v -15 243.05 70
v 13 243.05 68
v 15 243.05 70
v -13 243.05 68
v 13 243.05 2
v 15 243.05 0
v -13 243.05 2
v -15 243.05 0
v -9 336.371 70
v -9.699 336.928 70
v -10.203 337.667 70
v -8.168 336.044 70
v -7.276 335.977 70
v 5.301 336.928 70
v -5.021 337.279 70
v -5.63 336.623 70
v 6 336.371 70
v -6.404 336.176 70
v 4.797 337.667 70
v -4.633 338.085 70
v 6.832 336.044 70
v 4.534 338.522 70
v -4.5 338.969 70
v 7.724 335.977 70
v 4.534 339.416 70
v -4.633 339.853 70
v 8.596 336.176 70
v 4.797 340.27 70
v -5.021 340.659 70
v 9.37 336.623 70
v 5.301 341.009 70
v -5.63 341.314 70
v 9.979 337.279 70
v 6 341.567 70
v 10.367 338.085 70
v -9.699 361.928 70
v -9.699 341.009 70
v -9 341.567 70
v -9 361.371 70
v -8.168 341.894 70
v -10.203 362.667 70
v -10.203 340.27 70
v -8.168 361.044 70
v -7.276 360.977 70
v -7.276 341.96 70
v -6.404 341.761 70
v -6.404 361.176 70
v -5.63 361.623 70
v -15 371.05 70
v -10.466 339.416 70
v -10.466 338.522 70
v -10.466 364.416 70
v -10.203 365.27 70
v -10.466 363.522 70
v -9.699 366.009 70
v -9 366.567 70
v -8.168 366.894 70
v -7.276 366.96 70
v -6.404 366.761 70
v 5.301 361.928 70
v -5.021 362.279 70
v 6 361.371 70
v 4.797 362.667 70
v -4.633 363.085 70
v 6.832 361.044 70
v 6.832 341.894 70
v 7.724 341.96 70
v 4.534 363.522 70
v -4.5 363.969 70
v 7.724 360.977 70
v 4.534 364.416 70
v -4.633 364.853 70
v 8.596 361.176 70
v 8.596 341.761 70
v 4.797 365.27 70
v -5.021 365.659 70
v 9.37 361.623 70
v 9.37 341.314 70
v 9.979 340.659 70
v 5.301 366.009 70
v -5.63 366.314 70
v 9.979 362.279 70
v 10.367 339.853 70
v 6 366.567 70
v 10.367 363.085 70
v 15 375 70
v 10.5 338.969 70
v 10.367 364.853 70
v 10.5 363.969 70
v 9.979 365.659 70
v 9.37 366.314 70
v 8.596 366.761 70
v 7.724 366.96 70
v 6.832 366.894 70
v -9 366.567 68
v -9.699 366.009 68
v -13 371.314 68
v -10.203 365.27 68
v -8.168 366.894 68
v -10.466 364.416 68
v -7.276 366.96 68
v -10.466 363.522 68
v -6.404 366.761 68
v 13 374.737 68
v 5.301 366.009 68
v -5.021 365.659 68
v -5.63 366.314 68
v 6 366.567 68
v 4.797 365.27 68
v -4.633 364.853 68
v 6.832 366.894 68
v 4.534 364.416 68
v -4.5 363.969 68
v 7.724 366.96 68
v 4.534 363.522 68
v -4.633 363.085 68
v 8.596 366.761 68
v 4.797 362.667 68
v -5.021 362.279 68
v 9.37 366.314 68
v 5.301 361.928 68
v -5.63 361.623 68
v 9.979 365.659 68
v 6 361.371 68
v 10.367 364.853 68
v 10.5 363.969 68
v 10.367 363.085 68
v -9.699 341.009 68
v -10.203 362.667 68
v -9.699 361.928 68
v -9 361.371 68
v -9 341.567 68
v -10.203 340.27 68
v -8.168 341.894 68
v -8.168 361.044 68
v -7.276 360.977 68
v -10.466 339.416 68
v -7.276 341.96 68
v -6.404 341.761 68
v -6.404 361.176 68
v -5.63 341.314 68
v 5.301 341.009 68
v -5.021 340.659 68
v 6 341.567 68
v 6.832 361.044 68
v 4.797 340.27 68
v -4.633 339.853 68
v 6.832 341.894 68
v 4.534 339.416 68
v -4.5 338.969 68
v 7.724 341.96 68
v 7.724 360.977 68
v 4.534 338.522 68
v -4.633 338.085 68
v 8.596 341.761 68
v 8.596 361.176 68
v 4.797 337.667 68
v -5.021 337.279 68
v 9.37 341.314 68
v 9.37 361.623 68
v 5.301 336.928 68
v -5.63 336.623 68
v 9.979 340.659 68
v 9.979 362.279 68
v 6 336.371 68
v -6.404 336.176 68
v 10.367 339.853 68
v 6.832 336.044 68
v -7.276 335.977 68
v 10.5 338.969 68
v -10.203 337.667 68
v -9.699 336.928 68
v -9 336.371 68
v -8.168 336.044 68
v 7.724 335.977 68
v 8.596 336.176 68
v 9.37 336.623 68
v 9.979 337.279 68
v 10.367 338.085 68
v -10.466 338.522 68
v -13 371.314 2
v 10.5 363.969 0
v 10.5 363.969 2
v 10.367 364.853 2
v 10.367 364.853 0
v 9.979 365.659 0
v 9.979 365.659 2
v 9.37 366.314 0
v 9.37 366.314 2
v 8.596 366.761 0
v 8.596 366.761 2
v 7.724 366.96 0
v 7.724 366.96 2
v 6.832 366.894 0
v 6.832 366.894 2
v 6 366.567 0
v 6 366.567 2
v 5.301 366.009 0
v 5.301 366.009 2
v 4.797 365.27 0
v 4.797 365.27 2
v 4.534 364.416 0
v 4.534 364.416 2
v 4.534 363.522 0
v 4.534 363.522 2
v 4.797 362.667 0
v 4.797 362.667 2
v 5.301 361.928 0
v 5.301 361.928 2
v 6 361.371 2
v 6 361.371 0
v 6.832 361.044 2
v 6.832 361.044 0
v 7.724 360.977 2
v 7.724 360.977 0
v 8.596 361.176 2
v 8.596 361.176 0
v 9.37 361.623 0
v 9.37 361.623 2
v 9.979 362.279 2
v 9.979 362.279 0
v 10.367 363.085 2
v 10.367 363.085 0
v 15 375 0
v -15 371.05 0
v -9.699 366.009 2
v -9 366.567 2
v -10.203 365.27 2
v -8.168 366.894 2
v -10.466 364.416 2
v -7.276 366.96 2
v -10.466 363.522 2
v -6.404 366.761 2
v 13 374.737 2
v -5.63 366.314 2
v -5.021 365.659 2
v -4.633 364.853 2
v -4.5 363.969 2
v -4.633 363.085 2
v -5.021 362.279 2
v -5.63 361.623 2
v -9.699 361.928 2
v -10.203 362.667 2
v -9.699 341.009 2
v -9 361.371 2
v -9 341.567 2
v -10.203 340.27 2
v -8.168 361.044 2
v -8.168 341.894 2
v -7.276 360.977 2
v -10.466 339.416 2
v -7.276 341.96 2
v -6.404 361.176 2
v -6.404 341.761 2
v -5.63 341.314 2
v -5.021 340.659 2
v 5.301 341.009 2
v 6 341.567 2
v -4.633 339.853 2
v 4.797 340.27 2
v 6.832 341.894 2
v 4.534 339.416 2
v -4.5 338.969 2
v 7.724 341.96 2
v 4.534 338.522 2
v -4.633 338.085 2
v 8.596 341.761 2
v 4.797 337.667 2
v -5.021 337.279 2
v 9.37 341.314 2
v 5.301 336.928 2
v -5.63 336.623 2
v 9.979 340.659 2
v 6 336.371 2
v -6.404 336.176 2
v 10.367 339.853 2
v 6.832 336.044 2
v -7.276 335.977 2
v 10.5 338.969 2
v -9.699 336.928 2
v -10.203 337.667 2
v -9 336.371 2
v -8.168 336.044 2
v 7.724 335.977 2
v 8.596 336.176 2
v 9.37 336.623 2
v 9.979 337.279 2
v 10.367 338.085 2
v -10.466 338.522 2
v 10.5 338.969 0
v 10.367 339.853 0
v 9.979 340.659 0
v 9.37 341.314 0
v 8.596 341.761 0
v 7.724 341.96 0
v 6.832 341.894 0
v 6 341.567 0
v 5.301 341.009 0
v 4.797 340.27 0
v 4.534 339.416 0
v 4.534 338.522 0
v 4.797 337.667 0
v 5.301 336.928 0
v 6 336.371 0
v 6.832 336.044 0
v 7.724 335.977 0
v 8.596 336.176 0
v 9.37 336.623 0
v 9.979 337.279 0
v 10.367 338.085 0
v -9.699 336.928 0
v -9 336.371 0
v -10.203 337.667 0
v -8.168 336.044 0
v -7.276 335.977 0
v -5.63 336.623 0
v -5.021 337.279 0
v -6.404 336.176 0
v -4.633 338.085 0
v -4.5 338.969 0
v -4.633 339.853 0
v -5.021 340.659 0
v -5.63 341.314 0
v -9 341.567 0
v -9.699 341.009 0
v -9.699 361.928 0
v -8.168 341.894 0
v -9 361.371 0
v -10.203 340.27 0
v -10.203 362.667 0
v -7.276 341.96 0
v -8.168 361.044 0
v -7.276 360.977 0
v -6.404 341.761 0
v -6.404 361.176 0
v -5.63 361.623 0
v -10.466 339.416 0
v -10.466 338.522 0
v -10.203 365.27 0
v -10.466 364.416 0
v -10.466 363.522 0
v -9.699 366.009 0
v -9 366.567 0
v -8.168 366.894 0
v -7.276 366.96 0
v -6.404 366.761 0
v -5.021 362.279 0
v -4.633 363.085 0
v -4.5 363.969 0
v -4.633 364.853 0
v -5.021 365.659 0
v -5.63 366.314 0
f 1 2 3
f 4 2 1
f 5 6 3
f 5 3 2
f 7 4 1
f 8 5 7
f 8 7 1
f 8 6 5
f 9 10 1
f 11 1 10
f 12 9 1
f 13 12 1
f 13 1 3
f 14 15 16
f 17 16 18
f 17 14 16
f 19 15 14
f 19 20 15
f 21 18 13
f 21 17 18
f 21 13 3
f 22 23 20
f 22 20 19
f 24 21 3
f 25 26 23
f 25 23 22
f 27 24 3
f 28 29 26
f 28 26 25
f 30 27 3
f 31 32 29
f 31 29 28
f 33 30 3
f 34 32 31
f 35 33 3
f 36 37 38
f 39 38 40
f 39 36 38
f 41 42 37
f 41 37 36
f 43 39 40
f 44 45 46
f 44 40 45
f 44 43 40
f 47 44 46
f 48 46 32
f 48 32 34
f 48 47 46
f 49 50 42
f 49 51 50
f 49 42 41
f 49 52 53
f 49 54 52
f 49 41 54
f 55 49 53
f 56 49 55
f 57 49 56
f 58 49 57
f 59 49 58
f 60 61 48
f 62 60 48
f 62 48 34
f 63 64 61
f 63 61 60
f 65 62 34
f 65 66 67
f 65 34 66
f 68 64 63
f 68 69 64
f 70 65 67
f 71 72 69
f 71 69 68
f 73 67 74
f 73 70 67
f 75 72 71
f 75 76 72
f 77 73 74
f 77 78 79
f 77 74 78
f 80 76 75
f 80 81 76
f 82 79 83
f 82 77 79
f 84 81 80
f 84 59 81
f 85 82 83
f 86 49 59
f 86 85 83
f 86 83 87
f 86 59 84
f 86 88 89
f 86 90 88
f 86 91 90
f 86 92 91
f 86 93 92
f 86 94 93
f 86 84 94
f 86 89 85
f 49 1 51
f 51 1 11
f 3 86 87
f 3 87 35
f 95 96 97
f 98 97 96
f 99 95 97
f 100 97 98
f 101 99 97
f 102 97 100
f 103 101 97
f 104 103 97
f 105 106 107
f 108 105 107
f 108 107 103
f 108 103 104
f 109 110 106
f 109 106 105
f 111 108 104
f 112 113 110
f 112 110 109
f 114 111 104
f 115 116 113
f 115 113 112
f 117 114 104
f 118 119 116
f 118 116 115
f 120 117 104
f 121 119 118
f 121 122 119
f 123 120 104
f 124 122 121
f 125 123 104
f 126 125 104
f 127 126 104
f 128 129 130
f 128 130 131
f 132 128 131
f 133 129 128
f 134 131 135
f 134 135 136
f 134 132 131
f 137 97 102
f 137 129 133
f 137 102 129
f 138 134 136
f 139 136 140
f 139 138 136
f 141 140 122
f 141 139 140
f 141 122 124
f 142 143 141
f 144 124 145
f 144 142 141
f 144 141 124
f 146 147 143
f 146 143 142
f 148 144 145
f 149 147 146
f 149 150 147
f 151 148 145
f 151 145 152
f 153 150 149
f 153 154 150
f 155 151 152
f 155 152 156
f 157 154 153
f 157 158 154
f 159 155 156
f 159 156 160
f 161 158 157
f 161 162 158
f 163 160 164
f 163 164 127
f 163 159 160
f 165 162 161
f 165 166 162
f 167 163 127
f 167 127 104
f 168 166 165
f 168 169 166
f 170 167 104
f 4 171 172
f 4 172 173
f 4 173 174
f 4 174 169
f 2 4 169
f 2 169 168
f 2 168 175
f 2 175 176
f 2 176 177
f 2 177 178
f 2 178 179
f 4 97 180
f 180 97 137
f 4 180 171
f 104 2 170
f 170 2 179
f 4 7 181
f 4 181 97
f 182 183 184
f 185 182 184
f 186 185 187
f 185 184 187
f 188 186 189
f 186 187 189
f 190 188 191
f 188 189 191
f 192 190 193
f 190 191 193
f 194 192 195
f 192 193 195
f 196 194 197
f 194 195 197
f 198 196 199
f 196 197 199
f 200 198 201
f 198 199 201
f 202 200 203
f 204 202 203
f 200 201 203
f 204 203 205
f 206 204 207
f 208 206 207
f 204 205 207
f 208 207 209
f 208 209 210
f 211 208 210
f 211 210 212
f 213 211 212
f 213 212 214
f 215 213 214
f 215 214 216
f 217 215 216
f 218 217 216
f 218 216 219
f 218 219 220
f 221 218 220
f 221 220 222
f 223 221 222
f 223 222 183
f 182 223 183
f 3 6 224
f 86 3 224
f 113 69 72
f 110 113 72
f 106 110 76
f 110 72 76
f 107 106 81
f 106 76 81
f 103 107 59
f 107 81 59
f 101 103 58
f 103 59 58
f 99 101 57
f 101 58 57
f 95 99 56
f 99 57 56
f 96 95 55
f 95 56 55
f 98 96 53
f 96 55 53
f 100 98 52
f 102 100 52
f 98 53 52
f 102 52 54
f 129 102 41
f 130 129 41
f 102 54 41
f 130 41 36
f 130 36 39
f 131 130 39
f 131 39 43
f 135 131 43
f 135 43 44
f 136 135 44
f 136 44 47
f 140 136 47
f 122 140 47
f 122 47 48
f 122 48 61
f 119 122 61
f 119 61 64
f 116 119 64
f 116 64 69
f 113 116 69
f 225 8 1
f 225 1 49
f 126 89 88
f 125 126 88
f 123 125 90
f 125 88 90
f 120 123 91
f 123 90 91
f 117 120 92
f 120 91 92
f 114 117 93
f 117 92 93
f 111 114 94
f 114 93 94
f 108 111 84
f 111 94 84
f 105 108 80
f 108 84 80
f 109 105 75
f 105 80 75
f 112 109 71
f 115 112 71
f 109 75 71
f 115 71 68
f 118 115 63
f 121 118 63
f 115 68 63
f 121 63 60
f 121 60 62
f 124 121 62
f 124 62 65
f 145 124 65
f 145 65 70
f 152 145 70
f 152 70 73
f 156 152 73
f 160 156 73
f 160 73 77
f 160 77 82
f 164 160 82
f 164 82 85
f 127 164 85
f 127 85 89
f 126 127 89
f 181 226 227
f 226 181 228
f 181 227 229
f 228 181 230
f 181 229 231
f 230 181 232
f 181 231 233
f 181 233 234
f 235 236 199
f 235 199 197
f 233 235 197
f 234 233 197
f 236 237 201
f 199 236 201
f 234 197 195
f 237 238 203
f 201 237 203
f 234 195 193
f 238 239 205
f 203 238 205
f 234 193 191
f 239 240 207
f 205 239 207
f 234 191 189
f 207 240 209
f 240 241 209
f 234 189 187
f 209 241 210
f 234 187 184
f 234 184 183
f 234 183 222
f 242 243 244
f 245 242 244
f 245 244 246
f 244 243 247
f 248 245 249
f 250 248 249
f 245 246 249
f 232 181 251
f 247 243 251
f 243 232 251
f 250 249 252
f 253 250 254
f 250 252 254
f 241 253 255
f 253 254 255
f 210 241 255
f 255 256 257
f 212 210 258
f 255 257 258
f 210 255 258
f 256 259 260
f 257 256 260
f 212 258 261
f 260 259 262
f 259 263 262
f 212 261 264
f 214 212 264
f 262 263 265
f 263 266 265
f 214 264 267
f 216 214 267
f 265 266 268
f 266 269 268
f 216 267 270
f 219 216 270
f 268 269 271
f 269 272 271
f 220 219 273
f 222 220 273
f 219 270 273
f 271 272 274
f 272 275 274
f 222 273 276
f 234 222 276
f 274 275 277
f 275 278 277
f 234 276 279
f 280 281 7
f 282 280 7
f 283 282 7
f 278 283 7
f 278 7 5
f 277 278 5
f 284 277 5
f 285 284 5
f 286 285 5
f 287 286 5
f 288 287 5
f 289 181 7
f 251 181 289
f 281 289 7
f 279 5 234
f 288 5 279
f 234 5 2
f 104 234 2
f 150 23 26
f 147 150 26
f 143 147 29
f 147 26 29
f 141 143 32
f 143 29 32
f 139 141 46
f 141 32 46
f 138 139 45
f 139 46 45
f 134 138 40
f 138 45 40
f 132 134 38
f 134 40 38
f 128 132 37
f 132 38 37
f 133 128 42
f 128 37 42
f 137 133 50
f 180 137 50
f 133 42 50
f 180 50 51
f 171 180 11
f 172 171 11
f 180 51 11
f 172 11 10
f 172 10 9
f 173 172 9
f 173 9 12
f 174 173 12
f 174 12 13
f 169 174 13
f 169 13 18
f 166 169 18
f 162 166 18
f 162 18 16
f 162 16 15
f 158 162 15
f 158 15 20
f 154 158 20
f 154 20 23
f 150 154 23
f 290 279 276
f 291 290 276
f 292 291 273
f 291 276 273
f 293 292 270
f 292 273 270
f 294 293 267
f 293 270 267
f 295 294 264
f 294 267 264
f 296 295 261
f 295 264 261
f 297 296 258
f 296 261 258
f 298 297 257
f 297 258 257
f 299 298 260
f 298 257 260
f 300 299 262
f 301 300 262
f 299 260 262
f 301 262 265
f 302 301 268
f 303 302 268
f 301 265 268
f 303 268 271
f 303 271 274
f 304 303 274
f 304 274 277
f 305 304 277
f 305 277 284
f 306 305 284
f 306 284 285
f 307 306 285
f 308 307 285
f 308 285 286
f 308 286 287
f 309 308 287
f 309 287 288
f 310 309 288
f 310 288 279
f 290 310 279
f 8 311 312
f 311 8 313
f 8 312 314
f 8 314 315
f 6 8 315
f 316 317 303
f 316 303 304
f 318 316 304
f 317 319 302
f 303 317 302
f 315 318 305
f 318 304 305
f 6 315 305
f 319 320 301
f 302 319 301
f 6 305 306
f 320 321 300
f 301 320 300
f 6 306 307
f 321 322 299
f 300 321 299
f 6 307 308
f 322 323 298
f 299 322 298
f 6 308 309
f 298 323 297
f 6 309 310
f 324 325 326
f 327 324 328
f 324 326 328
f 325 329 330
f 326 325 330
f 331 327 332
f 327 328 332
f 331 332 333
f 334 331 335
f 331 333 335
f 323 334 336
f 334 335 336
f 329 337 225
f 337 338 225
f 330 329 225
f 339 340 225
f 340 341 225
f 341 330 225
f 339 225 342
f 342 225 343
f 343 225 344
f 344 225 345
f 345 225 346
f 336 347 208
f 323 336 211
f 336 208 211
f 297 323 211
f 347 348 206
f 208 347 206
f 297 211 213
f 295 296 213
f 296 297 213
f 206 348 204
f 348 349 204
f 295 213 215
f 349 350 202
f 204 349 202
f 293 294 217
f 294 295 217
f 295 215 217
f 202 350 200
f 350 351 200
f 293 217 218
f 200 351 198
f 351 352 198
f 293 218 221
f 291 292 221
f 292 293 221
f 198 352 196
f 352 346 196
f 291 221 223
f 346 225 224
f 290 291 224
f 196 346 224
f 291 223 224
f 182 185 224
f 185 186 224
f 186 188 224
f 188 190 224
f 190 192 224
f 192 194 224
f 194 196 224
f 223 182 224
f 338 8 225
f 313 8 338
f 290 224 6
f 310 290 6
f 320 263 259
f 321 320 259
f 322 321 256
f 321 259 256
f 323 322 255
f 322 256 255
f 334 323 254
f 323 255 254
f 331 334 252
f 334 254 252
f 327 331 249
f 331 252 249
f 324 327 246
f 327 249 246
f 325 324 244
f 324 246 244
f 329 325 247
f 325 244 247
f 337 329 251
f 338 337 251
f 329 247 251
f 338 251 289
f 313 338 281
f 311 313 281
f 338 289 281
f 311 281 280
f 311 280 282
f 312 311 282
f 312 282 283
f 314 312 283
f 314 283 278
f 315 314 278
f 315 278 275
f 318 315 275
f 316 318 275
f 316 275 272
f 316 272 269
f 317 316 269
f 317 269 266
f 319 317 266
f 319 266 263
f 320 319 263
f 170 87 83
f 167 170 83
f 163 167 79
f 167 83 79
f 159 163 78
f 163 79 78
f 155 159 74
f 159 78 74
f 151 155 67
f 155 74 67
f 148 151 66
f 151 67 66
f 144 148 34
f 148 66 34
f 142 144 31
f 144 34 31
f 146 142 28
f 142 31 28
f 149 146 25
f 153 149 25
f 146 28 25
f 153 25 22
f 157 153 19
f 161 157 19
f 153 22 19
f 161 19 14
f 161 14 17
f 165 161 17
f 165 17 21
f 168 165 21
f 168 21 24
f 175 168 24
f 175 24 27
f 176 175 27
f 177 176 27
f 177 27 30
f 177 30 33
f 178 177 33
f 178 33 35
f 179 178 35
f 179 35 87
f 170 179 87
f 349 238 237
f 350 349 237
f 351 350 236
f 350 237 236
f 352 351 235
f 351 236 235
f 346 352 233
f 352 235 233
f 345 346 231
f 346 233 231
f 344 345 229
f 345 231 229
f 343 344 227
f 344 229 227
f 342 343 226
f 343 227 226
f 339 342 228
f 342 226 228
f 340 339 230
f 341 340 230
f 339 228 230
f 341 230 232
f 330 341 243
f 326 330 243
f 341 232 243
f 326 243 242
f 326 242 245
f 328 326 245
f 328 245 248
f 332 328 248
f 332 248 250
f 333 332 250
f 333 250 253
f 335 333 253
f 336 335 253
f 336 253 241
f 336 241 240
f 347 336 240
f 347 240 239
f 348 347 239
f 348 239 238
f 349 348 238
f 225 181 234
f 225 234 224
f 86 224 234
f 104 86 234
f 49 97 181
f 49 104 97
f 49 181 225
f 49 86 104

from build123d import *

# Parameters (mm, degrees)
SKETCH_1_W          = 30
SKETCH_1_H          = 750
SKETCH_1_R          = 2.000000003
SKETCH_1_R_2        = 2.000000001
EXTRUDE_2_DEPTH     = 70
SKETCH_2_W          = 26
SKETCH_2_H          = 66
CUT_EXTRUDE_3_DEPTH = 751
CUT_EXTRUDE_4_DEPTH = 71
SKETCH_4_W          = 30
SKETCH_4_H          = 922.920510985
CUT_EXTRUDE_5_DEPTH = 71
SKETCH_5_R          = 3
CUT_EXTRUDE_6_DEPTH = 91


with BuildPart() as part:
    # 草图1 → 凸台-拉伸2 (new body)
    with BuildSketch(Plane.XY):
        Rectangle(SKETCH_1_W, SKETCH_1_H)
        with Locations((-7.5, 363.96878712)):
            Circle(SKETCH_1_R, mode=Mode.SUBTRACT)
        with Locations((7.5, 363.96878712)):
            Circle(SKETCH_1_R, mode=Mode.SUBTRACT)
        with Locations((-7.5, 338.96878712)):
            Circle(SKETCH_1_R, mode=Mode.SUBTRACT)
        with Locations((7.5, 338.96878712)):
            Circle(SKETCH_1_R, mode=Mode.SUBTRACT)
        with Locations((-7.5, -312.867936975)):
            Circle(SKETCH_1_R_2, mode=Mode.SUBTRACT)
        with Locations((7.5, -312.867936975)):
            Circle(SKETCH_1_R_2, mode=Mode.SUBTRACT)
        with Locations((-7.5, -337.867936975)):
            Circle(SKETCH_1_R_2, mode=Mode.SUBTRACT)
        with Locations((7.5, -337.867936975)):
            Circle(SKETCH_1_R_2, mode=Mode.SUBTRACT)
    extrude(amount=EXTRUDE_2_DEPTH)

    # 草图2 → 切除-拉伸3 (cut, through all)
    with BuildSketch(Plane.XZ.offset(375)):
        with Locations((0, 35)):
            Rectangle(SKETCH_2_W, SKETCH_2_H)
    extrude(amount=-CUT_EXTRUDE_3_DEPTH, mode=Mode.SUBTRACT)

    # 草图3 → 切除-拉伸4 (cut, through all)
    with BuildSketch(Plane.XY.offset(70)):
        Polygon((15, -375), (15, -347.1), (-15, -343.150425072), (-15, -375), align=None)
        Polygon((15, 377.040830045), (15, 375), (-15, 371.050425072), (-15, 377.040830045), align=None)
    extrude(amount=-CUT_EXTRUDE_4_DEPTH, mode=Mode.SUBTRACT)

    # 草图4 → 切除-拉伸5 (cut, through all)
    with BuildSketch(Plane(origin=(0, 0, 0), x_dir=(-1, 0, 0), z_dir=(0, 0, -1))):
        with Locations((0, -218.40983042)):
            Rectangle(SKETCH_4_W, SKETCH_4_H)
    extrude(amount=-CUT_EXTRUDE_5_DEPTH, mode=Mode.SUBTRACT)

    # 草图5 → 切除-拉伸6 (cut)
    with BuildSketch(Plane.XY.offset(70)):
        with Locations((-7.5, 363.96878712)):
            Circle(SKETCH_5_R)
        with Locations((7.5, 363.96878712)):
            Circle(SKETCH_5_R)
        with Locations((7.5, 338.96878712)):
            Circle(SKETCH_5_R)
        with Locations((-7.5, 338.96878712)):
            Circle(SKETCH_5_R)
    extrude(amount=-CUT_EXTRUDE_6_DEPTH, mode=Mode.SUBTRACT)


solid = part.part
